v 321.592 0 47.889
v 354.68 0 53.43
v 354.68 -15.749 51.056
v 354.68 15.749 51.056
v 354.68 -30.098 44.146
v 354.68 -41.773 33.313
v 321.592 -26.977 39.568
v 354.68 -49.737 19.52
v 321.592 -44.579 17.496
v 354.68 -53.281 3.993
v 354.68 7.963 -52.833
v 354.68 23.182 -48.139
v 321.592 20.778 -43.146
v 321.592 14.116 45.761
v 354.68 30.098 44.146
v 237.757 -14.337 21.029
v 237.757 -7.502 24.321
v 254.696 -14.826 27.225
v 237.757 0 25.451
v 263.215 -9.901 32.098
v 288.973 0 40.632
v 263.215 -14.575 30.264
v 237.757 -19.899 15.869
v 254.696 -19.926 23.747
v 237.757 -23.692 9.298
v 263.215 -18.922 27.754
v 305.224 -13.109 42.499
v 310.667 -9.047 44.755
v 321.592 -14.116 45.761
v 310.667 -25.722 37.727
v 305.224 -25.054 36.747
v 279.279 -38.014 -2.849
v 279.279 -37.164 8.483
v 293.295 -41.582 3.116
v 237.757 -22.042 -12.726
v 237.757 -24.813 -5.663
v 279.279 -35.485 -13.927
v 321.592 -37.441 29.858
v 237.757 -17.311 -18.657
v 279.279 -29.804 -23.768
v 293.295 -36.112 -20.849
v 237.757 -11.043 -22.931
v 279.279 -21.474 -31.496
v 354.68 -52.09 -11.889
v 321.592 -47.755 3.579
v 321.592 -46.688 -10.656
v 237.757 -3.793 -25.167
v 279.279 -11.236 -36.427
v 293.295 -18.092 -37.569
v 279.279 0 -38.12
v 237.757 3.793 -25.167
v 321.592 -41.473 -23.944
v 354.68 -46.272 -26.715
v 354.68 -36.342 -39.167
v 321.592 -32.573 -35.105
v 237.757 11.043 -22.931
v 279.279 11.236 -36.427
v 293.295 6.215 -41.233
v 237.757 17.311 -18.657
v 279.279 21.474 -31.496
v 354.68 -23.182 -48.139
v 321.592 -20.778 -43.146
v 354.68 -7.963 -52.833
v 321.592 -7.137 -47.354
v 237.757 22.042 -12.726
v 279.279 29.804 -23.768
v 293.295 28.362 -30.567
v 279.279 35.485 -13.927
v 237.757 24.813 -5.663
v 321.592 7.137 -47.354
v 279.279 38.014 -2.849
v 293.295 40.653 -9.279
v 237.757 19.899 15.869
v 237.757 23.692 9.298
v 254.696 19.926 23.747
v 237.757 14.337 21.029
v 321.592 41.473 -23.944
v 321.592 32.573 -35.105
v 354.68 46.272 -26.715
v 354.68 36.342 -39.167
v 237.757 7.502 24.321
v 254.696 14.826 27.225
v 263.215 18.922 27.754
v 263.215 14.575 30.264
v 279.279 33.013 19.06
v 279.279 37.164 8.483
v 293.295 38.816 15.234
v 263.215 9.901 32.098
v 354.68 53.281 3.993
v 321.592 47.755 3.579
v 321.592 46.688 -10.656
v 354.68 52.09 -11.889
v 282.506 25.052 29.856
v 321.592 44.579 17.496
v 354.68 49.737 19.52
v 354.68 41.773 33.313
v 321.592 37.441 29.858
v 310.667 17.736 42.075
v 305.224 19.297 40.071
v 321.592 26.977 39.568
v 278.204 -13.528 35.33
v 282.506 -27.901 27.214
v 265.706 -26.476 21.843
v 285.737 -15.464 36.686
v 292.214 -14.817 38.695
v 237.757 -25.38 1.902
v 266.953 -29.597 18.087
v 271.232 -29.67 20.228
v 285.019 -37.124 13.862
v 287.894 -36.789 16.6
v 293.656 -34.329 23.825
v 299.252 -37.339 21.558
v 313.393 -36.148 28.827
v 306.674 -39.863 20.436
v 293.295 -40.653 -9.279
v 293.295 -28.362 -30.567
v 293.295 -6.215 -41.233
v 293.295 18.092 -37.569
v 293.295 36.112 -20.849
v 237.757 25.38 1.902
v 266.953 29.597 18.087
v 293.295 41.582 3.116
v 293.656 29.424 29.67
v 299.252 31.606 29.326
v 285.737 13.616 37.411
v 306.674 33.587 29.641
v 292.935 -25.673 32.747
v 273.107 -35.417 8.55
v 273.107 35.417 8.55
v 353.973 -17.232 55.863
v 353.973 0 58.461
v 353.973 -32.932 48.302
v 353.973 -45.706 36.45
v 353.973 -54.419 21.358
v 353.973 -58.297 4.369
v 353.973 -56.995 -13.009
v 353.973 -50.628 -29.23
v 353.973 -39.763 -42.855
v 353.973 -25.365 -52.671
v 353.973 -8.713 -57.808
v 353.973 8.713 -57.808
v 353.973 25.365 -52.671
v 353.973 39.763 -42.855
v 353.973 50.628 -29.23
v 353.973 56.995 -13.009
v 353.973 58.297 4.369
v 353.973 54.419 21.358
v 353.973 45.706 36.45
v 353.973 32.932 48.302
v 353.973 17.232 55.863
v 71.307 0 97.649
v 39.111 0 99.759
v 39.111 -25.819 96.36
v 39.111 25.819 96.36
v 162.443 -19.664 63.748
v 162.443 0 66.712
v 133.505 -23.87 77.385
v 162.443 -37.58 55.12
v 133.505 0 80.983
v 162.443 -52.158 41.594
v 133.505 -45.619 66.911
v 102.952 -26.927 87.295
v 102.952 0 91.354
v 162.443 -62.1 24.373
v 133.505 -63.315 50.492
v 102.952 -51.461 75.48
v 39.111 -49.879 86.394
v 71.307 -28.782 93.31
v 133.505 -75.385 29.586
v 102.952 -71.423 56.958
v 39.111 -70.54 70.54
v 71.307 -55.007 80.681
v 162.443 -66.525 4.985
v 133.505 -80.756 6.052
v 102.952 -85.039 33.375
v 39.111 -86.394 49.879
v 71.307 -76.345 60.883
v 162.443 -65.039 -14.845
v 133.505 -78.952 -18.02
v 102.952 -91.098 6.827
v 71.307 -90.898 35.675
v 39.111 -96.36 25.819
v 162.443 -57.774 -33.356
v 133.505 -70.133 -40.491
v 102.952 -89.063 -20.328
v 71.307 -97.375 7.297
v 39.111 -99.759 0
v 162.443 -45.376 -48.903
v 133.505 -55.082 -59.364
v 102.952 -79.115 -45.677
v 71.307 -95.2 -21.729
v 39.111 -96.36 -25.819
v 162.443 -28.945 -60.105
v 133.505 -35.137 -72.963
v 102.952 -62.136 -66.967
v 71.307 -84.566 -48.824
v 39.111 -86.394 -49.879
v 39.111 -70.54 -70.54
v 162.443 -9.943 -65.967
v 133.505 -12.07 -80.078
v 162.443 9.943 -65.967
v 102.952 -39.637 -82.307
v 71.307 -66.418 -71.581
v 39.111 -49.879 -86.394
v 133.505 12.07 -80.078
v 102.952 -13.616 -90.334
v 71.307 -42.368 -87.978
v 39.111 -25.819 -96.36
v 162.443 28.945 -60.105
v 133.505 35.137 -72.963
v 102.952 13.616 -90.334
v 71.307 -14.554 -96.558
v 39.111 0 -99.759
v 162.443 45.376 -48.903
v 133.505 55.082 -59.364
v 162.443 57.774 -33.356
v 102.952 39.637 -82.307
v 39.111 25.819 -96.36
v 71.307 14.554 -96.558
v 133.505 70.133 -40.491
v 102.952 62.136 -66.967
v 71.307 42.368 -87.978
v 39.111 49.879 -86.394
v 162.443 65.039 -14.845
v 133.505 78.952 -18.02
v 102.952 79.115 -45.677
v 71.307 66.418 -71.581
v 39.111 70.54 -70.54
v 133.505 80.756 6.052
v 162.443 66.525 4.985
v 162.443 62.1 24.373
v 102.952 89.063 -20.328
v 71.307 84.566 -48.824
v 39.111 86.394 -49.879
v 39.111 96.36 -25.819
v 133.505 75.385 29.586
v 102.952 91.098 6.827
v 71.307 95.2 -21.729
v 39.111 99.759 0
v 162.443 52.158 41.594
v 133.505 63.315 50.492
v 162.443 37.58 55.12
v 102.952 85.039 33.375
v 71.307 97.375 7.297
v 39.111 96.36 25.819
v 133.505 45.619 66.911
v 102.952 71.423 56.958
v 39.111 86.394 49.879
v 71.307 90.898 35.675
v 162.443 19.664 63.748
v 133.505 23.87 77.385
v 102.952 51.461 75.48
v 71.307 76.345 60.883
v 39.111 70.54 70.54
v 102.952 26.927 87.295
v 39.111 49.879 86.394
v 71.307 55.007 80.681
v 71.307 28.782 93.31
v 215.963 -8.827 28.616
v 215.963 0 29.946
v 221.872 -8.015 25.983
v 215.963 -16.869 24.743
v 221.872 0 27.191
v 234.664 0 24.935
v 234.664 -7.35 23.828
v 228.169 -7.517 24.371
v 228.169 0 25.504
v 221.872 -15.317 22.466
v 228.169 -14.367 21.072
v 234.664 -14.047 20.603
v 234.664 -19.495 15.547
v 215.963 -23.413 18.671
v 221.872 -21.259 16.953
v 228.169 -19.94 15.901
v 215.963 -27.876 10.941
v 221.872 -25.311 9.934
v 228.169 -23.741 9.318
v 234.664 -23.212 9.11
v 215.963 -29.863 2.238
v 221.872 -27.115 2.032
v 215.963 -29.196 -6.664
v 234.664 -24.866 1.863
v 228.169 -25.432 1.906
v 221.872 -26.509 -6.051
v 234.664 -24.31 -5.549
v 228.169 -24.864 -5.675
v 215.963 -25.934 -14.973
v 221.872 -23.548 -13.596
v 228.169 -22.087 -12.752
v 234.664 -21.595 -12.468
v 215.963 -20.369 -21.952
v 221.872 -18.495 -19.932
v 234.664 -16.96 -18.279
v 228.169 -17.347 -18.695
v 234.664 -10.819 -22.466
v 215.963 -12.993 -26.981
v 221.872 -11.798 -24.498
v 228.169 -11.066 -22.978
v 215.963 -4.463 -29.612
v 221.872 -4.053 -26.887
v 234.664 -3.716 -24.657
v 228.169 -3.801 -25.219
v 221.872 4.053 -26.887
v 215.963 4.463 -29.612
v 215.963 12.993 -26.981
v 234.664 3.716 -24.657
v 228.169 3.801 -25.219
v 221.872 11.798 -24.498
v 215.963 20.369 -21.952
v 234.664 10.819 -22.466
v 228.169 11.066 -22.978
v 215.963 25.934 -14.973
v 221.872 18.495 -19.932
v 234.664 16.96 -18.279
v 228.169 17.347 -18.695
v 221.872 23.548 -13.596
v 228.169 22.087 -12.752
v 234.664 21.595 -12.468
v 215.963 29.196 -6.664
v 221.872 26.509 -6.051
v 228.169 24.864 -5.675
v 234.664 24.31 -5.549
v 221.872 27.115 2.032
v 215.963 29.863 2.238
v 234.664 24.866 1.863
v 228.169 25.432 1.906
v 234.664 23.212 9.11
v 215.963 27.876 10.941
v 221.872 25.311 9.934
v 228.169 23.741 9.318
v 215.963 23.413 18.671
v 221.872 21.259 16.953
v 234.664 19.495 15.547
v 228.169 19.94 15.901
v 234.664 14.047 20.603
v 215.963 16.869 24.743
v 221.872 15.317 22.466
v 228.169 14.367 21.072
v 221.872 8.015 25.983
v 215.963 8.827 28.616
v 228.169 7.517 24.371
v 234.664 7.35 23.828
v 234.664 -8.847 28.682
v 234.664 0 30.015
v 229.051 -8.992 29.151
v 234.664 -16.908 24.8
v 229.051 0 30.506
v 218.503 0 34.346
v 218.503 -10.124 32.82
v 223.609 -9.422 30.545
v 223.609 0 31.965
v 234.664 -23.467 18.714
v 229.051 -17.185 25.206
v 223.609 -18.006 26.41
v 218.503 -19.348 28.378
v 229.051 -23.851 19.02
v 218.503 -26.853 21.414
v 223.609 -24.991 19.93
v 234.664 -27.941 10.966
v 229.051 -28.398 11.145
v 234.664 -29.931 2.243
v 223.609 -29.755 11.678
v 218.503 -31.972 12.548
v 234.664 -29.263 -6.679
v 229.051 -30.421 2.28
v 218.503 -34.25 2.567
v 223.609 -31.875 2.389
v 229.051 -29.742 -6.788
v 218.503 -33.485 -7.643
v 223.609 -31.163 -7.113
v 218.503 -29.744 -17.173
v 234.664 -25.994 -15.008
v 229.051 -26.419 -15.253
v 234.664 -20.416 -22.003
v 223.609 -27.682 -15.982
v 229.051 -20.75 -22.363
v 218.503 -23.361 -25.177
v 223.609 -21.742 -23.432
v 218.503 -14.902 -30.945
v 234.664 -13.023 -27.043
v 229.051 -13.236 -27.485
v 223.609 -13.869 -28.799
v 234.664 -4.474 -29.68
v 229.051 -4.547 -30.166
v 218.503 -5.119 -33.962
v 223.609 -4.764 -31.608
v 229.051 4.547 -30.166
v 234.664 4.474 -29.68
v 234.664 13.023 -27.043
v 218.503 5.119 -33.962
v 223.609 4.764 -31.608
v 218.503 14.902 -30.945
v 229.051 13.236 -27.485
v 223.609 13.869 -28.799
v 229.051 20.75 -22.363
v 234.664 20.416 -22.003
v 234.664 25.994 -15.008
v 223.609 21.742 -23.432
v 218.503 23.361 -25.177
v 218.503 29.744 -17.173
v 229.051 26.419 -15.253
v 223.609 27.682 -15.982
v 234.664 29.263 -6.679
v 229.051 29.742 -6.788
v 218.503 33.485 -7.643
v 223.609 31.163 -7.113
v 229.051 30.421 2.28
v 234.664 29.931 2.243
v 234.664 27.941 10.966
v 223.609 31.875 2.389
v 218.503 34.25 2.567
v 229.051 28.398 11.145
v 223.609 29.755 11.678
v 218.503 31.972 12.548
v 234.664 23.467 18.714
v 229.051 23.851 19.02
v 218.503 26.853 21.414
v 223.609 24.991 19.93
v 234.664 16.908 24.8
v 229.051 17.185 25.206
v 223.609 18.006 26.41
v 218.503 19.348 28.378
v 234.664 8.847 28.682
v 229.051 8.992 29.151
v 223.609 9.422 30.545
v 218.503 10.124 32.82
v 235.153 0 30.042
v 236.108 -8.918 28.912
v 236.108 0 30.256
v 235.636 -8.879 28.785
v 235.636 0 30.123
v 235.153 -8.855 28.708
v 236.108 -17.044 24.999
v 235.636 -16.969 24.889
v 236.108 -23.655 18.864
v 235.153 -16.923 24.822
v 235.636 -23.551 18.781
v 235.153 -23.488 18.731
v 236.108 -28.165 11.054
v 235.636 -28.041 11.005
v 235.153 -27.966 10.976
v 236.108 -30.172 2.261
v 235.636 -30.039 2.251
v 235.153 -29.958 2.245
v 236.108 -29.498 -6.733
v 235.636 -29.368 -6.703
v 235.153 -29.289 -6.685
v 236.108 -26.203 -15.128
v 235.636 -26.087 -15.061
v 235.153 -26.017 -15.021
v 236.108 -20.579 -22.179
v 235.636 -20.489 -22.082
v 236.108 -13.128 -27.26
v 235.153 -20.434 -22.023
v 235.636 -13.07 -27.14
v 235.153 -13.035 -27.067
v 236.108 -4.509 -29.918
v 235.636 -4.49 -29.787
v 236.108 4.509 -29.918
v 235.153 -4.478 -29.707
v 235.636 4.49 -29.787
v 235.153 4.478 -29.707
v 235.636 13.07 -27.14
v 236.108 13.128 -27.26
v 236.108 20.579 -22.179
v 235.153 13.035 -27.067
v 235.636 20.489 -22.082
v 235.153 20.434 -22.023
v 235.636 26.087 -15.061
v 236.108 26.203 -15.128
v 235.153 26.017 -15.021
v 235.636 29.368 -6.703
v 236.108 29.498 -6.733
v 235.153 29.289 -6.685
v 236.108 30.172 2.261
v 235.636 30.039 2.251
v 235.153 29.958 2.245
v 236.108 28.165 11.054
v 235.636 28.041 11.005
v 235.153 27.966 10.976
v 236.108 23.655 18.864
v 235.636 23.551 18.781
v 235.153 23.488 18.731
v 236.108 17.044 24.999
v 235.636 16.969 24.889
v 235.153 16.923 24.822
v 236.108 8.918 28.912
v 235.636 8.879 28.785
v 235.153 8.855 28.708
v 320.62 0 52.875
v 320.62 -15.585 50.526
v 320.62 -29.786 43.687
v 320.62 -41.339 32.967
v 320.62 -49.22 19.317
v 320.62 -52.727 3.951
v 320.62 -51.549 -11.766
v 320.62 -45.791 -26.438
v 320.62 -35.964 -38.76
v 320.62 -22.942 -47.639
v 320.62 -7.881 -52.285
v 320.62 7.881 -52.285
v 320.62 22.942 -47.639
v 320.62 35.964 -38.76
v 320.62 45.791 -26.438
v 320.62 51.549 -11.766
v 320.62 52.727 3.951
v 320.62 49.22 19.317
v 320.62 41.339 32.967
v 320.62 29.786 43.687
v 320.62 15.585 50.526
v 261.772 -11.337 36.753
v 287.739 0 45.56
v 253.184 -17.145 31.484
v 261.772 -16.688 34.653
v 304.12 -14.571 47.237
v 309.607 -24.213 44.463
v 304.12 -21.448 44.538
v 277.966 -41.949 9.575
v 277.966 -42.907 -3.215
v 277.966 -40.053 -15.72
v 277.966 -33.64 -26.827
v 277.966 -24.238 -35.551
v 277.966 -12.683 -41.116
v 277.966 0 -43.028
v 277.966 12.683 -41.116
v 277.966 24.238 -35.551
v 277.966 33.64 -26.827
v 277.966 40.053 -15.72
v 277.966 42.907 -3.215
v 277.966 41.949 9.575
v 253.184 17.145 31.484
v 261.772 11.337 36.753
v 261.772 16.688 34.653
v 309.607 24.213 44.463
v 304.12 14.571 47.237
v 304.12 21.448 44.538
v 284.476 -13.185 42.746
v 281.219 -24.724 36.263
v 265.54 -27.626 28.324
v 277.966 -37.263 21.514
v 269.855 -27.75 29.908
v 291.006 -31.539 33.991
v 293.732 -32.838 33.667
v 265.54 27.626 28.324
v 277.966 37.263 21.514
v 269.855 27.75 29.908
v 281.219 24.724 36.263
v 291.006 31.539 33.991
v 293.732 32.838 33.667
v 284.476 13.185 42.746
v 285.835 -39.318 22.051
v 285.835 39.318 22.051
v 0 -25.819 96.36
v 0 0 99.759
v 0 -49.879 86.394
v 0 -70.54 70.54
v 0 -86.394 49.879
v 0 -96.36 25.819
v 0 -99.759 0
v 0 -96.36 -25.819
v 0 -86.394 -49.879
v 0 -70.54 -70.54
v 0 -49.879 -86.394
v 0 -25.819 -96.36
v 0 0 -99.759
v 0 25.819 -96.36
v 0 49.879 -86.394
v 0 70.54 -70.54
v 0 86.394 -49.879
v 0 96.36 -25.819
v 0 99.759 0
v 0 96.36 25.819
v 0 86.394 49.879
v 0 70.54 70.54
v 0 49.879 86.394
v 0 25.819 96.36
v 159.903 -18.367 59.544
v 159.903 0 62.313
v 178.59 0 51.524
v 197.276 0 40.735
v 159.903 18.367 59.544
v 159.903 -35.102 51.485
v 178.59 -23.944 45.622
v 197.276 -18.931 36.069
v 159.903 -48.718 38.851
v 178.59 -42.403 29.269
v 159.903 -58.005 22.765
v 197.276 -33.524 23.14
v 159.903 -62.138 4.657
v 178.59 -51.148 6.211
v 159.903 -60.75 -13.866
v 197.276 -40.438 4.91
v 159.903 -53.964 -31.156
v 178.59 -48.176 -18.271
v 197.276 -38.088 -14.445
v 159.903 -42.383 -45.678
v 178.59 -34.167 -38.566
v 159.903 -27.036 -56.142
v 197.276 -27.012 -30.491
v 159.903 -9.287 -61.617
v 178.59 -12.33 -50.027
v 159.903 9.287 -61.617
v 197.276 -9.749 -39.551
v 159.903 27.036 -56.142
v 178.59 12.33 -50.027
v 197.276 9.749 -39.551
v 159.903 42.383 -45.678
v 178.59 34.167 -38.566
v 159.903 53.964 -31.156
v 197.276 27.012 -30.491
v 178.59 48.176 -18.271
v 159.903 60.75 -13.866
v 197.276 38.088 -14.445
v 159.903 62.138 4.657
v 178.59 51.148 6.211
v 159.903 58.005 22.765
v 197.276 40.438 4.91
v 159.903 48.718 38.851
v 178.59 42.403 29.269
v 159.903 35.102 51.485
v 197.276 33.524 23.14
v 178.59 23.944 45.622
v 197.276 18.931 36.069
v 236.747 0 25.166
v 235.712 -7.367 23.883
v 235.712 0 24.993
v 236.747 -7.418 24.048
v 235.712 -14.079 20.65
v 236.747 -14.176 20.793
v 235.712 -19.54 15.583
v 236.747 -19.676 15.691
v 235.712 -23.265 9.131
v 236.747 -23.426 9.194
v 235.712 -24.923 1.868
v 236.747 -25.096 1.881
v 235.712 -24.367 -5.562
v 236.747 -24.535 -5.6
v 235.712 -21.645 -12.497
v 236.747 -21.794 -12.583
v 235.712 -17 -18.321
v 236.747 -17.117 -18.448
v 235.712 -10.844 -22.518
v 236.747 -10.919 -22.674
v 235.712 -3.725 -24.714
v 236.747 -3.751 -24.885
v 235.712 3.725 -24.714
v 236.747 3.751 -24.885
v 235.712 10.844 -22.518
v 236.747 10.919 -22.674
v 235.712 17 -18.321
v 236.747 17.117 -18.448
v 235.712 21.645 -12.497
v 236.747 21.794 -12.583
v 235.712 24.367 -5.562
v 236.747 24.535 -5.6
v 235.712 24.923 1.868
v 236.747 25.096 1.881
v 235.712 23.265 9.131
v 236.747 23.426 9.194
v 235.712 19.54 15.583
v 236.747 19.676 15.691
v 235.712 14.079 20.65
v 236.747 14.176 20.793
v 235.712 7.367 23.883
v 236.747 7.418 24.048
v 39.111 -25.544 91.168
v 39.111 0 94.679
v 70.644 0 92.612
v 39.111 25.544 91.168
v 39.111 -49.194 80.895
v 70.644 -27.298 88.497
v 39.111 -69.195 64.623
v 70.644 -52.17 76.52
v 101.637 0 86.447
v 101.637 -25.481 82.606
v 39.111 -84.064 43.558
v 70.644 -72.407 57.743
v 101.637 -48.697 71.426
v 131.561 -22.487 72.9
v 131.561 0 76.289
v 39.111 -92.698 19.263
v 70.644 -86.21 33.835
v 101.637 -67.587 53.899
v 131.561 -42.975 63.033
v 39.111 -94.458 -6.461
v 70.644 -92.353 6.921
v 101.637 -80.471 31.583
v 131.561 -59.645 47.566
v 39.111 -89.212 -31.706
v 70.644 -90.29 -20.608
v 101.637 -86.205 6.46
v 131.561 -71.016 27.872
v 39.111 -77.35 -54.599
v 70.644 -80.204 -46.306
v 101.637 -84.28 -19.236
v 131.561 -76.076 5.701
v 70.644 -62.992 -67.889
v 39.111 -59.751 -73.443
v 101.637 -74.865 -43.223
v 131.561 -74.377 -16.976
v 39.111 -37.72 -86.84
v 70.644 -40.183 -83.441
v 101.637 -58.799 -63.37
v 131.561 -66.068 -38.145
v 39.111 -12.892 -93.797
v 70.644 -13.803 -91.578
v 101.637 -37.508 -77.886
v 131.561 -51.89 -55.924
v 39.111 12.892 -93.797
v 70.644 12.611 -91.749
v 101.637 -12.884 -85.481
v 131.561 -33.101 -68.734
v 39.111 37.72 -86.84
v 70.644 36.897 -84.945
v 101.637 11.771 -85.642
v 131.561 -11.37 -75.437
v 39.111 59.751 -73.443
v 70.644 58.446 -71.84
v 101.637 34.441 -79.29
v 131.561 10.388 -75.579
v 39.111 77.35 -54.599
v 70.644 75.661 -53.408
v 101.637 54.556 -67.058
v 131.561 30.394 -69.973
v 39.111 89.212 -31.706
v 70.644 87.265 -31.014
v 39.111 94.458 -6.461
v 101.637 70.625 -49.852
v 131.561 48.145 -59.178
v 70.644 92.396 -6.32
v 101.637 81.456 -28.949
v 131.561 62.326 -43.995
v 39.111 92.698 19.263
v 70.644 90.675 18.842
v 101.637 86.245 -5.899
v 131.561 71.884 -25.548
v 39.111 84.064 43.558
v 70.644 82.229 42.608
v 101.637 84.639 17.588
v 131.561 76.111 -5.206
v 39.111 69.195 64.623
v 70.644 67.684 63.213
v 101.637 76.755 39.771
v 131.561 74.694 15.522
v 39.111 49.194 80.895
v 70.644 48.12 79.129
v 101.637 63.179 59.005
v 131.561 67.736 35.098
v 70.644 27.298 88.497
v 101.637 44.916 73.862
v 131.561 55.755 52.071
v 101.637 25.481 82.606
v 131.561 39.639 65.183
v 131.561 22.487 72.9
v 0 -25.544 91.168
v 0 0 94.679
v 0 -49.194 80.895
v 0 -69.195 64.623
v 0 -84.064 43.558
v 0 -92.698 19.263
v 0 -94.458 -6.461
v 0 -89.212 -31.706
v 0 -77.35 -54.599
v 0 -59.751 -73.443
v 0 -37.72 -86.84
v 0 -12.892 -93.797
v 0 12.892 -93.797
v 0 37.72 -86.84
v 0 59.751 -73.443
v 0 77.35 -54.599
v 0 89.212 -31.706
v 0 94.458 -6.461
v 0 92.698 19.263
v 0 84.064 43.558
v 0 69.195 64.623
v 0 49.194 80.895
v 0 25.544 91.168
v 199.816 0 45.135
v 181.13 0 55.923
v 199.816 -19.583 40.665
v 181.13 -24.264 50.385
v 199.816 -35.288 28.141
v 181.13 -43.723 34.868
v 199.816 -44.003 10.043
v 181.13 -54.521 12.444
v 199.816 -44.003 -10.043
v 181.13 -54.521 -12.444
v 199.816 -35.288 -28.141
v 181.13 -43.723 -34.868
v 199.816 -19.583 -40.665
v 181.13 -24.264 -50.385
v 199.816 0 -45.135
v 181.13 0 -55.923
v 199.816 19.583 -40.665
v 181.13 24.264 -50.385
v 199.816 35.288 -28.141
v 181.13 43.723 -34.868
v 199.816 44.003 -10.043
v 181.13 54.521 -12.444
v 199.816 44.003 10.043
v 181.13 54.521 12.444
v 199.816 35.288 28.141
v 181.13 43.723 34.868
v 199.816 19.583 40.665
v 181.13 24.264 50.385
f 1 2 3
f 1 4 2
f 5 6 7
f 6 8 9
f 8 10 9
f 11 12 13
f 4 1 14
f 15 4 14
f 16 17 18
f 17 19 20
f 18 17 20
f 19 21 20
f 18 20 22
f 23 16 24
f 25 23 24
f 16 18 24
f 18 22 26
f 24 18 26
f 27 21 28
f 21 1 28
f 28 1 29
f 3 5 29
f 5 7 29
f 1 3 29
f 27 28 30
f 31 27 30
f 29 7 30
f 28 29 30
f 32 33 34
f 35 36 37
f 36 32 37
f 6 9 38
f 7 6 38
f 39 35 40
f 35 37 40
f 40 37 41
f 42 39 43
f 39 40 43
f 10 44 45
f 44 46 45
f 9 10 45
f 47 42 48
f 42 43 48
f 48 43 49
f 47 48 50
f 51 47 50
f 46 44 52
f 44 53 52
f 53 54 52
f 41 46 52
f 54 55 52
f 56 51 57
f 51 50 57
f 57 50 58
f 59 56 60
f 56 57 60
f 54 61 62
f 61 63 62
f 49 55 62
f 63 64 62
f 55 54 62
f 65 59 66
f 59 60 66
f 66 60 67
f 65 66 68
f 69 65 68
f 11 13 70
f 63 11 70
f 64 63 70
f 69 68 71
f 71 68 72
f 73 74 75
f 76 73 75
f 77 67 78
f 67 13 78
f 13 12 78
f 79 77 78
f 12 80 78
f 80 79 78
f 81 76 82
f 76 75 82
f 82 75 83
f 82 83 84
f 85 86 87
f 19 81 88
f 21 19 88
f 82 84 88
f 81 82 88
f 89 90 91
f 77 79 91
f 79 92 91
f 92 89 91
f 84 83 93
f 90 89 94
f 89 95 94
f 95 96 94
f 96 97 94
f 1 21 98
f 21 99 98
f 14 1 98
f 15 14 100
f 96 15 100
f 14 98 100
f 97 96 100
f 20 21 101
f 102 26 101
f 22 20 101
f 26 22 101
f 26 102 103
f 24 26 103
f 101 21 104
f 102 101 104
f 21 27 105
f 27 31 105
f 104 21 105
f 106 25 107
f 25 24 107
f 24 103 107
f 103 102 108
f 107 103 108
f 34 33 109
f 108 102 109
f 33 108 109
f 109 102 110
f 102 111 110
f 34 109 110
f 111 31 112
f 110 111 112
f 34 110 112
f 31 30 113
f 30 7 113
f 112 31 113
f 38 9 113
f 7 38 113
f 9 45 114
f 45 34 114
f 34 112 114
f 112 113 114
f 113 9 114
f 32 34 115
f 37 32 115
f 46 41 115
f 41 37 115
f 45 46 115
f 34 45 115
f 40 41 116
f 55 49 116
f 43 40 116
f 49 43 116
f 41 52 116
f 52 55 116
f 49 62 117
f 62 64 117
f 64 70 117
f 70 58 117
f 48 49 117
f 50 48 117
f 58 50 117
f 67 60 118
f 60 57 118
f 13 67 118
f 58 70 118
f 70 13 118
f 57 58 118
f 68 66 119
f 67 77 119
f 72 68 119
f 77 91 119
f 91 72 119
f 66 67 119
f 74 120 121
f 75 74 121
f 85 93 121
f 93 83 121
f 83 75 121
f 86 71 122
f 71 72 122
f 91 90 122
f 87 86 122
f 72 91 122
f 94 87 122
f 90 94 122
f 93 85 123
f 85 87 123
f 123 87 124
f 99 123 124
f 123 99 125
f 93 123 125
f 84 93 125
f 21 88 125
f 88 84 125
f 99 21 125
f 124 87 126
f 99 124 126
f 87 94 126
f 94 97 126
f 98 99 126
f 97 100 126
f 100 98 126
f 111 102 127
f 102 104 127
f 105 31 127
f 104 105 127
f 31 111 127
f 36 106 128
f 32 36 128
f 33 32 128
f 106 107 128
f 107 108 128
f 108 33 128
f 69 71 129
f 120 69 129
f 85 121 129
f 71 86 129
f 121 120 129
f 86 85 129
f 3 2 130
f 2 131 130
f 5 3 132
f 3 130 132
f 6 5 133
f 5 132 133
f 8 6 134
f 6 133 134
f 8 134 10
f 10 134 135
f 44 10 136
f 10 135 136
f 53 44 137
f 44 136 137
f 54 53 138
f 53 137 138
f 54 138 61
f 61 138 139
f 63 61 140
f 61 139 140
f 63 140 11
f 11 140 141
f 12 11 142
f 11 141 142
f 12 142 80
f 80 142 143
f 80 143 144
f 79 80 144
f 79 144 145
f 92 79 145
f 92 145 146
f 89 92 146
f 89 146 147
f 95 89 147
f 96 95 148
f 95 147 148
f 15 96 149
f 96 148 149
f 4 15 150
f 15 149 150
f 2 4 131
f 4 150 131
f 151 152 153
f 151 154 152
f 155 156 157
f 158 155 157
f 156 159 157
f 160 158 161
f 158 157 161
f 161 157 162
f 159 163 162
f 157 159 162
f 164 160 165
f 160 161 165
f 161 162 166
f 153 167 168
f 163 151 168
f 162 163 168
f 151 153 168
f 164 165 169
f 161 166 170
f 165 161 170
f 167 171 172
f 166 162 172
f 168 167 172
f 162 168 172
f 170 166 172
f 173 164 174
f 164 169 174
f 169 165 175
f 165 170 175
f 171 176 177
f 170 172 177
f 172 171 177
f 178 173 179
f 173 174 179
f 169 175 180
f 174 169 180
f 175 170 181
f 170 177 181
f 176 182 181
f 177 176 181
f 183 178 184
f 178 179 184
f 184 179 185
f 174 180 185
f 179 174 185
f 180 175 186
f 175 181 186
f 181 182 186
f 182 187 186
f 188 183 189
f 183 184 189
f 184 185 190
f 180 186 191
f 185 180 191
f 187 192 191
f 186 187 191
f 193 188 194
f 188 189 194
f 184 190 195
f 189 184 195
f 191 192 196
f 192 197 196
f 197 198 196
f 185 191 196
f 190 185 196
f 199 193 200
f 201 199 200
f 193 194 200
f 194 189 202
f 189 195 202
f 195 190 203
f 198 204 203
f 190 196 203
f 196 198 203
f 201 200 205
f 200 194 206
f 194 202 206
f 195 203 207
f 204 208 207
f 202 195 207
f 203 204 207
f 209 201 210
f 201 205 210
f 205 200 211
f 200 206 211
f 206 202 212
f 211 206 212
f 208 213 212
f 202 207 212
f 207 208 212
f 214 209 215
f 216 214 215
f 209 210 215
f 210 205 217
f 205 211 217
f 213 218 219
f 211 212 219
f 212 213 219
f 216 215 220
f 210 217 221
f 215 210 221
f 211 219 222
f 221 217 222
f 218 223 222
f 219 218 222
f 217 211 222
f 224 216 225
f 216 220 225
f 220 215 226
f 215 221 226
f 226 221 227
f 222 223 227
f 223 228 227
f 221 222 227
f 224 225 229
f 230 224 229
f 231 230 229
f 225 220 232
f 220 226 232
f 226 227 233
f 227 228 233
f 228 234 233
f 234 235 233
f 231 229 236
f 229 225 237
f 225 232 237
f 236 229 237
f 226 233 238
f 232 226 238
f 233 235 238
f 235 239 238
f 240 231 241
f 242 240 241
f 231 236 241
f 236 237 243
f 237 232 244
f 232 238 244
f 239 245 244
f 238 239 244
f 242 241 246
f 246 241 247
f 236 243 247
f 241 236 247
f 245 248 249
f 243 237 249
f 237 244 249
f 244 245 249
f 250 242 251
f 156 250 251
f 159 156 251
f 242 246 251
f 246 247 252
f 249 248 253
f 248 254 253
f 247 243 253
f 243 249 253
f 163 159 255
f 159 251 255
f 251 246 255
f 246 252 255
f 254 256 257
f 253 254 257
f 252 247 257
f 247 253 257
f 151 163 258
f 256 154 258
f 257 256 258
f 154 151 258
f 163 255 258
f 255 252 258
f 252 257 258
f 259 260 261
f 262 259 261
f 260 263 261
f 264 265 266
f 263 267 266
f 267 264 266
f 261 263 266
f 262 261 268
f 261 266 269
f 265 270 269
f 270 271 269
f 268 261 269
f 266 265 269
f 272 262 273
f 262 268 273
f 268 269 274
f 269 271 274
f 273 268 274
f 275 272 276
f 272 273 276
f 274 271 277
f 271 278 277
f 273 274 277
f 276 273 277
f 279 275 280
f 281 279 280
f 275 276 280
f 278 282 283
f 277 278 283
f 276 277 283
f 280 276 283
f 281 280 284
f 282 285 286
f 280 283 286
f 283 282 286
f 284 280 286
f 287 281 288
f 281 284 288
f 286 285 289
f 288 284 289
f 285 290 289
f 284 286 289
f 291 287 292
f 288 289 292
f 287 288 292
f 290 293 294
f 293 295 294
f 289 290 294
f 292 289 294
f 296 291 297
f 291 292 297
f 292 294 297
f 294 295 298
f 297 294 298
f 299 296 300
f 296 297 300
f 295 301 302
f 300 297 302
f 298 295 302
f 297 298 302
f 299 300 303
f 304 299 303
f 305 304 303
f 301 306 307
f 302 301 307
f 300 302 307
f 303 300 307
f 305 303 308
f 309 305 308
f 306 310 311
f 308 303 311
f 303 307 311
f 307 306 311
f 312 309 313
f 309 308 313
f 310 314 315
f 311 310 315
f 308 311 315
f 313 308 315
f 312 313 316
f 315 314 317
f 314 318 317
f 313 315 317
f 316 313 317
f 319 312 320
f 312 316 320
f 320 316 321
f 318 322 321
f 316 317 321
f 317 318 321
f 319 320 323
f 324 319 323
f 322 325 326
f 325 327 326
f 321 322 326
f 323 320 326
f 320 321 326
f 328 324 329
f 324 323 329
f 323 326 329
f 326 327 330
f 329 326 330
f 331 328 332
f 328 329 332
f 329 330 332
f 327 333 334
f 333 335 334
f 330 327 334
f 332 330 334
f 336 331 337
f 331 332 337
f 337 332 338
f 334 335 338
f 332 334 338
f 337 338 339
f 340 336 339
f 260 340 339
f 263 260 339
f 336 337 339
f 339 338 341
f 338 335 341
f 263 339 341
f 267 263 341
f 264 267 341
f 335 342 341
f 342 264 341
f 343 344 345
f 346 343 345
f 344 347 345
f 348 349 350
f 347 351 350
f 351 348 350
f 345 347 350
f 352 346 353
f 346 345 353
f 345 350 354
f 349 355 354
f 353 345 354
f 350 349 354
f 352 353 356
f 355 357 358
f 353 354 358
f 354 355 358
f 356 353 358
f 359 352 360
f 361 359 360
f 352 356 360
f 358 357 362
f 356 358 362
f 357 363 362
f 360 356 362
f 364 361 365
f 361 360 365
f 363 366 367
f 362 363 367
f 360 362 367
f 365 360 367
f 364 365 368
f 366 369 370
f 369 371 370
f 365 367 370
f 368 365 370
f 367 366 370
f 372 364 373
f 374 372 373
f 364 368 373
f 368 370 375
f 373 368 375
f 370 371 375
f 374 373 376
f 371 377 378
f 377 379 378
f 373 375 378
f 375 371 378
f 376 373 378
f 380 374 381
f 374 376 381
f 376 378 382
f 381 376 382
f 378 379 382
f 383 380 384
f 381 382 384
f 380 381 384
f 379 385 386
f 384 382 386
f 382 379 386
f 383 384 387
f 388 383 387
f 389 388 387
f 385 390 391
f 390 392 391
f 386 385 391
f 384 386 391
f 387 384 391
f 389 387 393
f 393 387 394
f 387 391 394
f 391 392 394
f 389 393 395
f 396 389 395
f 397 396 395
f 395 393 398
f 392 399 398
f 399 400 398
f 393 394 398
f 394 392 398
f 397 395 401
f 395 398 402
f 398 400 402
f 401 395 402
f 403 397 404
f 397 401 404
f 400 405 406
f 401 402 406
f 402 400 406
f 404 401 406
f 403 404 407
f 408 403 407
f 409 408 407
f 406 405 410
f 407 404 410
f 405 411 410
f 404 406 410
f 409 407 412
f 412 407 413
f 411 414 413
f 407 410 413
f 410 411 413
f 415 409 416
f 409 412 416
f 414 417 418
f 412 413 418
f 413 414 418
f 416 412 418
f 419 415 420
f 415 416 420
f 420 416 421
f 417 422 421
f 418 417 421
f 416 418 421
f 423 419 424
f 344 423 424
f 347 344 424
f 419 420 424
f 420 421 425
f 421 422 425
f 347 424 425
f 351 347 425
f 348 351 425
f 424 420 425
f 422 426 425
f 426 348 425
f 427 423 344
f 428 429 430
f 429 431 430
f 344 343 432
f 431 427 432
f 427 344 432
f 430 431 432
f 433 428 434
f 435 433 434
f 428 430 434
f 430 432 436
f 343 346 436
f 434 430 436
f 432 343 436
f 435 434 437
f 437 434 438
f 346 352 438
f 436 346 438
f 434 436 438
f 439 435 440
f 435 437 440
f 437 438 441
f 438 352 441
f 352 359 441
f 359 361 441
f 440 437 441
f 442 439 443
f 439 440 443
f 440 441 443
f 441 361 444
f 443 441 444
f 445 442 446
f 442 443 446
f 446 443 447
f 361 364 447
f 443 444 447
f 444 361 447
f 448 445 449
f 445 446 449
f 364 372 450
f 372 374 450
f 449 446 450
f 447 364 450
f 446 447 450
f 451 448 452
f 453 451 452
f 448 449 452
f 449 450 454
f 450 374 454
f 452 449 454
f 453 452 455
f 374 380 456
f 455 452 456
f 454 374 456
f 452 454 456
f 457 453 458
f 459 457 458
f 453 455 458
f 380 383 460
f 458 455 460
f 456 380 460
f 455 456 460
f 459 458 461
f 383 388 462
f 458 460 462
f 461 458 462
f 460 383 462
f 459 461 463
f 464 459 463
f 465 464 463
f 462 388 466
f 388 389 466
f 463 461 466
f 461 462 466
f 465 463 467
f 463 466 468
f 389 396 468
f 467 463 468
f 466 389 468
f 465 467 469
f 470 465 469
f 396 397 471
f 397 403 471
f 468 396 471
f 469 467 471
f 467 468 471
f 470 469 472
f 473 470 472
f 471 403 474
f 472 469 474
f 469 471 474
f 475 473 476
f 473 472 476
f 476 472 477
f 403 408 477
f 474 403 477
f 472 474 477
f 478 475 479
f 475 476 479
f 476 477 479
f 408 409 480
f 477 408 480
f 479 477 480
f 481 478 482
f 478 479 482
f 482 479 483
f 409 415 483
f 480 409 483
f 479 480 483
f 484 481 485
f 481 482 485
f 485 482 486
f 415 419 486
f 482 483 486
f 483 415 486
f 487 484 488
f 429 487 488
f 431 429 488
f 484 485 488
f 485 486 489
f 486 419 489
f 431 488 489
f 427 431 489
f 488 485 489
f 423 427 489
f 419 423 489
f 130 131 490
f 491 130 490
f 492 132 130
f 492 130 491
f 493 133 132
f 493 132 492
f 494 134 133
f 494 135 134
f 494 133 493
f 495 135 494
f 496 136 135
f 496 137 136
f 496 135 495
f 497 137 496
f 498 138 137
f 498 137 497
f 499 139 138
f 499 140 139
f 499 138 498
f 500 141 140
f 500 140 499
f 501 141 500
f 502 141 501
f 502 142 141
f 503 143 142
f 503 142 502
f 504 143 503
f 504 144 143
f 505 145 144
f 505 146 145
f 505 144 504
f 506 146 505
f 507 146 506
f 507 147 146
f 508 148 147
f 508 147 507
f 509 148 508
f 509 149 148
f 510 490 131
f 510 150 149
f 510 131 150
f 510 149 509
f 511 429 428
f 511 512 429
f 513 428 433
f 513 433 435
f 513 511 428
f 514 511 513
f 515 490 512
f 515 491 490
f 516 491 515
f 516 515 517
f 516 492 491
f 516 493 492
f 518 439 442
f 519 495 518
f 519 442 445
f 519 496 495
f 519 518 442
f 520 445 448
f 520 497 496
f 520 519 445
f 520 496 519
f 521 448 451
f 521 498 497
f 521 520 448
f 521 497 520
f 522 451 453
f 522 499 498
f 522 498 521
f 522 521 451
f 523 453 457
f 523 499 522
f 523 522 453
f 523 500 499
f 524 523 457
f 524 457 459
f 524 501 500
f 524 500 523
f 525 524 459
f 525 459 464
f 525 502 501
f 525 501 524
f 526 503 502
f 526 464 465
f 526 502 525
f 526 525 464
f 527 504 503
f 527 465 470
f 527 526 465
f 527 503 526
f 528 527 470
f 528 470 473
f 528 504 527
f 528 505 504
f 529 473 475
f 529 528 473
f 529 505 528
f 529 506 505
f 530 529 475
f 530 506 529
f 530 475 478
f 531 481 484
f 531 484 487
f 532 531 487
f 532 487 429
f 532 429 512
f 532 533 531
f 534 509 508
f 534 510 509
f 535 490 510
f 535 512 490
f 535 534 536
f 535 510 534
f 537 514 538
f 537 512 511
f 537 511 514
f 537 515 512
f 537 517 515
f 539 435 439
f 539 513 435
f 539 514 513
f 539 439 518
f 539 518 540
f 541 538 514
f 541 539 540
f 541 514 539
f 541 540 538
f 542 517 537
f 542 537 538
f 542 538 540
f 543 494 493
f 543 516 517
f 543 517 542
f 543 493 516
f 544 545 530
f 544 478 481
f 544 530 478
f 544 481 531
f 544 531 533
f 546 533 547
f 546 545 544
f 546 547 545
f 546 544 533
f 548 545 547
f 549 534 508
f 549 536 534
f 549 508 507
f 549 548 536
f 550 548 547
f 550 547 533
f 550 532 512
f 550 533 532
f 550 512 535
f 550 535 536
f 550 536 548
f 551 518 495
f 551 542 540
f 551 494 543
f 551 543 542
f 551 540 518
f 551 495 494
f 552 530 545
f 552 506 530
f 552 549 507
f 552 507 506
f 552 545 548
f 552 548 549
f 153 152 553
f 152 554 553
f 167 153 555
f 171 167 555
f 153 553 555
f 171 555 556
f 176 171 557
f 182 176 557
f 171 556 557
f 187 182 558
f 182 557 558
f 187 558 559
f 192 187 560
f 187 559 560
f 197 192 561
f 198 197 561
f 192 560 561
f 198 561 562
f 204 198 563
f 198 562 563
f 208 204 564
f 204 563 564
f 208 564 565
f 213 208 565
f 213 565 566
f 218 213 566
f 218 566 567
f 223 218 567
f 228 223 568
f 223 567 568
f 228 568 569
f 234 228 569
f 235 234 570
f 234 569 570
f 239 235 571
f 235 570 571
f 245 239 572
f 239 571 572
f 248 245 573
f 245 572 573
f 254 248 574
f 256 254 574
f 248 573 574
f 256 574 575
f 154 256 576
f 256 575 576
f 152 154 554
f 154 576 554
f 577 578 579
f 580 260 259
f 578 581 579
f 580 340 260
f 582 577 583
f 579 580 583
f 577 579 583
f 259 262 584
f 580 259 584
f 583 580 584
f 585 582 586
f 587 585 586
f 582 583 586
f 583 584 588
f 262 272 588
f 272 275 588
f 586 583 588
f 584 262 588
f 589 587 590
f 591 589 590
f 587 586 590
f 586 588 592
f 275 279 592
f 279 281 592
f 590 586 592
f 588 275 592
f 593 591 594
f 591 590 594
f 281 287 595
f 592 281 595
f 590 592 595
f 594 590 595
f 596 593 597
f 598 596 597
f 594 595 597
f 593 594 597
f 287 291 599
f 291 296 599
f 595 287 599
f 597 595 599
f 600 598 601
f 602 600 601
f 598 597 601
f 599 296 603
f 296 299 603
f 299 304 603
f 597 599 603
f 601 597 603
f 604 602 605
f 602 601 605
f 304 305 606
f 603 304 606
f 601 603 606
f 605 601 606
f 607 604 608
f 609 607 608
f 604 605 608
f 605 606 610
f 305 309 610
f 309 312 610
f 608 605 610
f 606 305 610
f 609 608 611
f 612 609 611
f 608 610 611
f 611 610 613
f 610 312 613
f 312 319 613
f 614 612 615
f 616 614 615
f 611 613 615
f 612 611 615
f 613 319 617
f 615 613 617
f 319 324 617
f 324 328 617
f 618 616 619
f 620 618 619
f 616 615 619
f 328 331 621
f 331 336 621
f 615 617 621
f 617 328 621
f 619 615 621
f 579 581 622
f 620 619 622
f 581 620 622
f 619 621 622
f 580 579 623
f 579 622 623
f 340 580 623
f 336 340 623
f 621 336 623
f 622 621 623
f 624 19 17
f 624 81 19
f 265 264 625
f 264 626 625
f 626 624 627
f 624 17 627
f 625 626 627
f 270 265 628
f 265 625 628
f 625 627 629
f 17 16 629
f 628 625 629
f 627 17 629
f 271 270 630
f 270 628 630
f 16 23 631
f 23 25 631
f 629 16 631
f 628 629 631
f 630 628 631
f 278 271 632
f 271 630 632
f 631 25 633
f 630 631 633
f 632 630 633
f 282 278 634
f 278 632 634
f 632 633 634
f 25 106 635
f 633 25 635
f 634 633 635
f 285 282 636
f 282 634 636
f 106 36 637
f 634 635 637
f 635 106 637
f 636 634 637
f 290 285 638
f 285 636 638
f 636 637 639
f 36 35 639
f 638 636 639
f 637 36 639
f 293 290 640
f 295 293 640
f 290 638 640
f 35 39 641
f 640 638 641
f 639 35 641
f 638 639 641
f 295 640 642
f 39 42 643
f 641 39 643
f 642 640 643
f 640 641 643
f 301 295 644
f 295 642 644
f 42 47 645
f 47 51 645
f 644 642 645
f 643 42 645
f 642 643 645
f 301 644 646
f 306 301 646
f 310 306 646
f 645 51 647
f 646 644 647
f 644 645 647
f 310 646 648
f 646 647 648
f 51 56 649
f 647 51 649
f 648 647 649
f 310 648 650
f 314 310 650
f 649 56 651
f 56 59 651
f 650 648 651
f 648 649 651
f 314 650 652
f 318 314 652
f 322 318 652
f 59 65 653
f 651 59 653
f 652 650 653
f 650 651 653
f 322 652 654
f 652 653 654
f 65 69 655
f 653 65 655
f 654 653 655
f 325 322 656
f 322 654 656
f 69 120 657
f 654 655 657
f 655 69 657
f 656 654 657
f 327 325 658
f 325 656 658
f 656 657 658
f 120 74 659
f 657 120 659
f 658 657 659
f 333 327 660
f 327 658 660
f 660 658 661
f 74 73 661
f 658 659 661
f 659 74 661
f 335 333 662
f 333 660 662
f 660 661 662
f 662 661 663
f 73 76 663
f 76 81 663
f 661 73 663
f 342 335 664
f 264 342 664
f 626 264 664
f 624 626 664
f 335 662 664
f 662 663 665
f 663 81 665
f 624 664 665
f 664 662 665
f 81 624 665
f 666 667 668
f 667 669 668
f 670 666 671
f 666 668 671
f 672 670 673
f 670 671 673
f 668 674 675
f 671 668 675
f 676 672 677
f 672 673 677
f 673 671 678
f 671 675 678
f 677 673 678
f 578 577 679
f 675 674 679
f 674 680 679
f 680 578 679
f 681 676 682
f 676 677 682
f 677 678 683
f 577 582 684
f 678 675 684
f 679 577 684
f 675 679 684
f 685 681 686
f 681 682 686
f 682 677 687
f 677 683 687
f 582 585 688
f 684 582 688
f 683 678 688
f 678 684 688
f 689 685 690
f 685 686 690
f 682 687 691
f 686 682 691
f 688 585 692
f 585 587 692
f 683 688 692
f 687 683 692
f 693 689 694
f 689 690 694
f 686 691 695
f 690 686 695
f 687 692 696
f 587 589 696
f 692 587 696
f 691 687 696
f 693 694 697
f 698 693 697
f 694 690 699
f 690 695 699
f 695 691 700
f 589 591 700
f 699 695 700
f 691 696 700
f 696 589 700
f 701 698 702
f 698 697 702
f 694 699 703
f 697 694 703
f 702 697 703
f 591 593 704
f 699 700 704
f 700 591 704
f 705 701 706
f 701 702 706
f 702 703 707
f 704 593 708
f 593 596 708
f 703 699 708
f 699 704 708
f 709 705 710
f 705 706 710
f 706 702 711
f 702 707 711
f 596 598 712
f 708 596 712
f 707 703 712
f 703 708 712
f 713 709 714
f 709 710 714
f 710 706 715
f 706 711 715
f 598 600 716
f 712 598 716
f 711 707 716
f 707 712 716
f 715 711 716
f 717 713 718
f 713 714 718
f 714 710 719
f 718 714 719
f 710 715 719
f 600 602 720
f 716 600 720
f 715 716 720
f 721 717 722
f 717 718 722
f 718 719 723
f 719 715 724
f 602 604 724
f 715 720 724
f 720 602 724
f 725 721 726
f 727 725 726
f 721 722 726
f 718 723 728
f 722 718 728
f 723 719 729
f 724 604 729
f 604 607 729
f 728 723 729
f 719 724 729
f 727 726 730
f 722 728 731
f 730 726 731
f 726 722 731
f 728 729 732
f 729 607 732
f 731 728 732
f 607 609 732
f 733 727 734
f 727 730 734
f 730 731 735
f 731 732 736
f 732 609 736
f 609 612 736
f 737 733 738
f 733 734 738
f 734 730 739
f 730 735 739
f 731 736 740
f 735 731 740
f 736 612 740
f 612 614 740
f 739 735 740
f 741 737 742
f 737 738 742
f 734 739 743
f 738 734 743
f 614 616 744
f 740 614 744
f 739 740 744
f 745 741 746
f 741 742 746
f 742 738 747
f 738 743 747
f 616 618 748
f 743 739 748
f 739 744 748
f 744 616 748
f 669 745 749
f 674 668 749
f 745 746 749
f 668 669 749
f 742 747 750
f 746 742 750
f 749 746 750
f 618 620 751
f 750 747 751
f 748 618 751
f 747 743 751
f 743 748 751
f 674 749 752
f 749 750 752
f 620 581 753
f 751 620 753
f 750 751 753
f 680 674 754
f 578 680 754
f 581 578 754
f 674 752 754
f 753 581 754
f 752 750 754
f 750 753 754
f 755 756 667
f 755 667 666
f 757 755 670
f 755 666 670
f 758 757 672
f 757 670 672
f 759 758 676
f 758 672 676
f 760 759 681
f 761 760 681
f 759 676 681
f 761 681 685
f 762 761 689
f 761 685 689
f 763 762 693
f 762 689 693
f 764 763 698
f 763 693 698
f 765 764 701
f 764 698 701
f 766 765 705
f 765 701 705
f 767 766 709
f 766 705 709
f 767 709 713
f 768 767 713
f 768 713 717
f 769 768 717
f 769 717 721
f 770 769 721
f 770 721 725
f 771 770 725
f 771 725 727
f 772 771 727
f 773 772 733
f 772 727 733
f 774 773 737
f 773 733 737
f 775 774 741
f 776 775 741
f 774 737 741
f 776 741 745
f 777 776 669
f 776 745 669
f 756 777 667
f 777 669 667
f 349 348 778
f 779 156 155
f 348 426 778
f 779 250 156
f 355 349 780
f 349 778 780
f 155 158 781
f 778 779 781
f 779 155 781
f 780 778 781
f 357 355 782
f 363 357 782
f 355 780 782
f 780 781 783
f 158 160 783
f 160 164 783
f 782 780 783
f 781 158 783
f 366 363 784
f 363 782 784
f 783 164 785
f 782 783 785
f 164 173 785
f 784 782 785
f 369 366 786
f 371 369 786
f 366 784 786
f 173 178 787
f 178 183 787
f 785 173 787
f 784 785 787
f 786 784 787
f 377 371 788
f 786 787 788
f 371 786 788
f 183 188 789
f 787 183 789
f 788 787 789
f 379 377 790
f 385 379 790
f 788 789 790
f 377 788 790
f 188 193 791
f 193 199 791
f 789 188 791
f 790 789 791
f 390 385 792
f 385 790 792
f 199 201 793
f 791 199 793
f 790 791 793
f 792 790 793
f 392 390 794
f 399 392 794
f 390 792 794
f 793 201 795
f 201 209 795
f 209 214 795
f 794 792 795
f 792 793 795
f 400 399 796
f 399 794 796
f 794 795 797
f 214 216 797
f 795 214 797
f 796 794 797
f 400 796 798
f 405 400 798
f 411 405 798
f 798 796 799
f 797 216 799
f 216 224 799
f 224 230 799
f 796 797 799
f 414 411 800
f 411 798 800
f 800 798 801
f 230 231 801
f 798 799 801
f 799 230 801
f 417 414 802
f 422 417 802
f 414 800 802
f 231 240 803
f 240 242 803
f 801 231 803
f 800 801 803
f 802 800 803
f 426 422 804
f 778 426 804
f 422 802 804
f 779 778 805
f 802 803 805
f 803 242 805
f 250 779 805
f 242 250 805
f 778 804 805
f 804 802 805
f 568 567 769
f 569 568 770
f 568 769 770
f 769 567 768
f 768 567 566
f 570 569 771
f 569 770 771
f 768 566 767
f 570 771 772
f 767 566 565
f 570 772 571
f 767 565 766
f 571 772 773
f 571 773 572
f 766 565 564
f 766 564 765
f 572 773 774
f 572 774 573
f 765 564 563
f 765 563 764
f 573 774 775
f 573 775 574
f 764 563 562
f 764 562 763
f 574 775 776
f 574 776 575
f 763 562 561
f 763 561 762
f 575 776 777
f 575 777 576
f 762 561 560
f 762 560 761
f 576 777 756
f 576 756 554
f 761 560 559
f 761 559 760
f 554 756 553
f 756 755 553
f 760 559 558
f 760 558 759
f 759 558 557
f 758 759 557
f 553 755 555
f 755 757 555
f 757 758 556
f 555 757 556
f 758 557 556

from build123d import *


with BuildPart() as part:
    # Model → Revolve1 (revolve)
    with BuildSketch(Plane.XY, mode=Mode.PRIVATE) as revolve1_sk:
        with BuildLine():
            Line((0, 94.6787794), (39.110731504, 94.6787794))
            ThreePointArc((39.110731504, 94.6787794), (101.637396909, 86.446986704), (159.90297235, 62.312591822))
            Line((159.90297235, 62.312591822), (215.962822425, 29.946417451))
            ThreePointArc((215.962822425, 29.946417451), (224.983711605, 26.209840113), (234.664318334, 24.9353578))
            ThreePointArc((234.664318334, 24.9353578), (236.232163558, 25.0652745), (237.757240536, 25.451483257))
            add(Edge.make_bspline(
                [(237.757240536, 25.451483257), (294.7004774, 45.0004942), (354.679631, 53.4300176)],
                knots=[0, 0, 0, 1, 1, 1], degree=2))
            Line((354.679631, 53.4300176), (353.972631393, 58.460579354))
            add(Edge.make_bspline(
                [(236.107739075, 30.256225178), (293.514278696, 49.963883796), (353.972631393, 58.460579354)],
                knots=[0, 0, 0, 1, 1, 1], degree=2))
            ThreePointArc((236.107739075, 30.256225178), (235.396010426, 30.075987816), (234.664322529, 30.0153578))
            ThreePointArc((234.664322529, 30.0153578), (226.298514539, 31.116742725), (218.50282271, 34.345826338))
            Line((218.50282271, 34.345826338), (162.442972634, 66.712000709))
            ThreePointArc((162.442972634, 66.712000709), (102.952197817, 91.353889859), (39.110731504, 99.7587794))
            Line((39.110731504, 99.7587794), (0, 99.7587794))
            Line((0, 99.7587794), (0, 94.6787794))
        make_face()
    revolve(revolve1_sk.sketch.rotate(Axis((0, 0, 0), (1, 0, 0)), 90), axis=Axis((0, 0, 0), (1, 0, 0)))


solid = part.part
